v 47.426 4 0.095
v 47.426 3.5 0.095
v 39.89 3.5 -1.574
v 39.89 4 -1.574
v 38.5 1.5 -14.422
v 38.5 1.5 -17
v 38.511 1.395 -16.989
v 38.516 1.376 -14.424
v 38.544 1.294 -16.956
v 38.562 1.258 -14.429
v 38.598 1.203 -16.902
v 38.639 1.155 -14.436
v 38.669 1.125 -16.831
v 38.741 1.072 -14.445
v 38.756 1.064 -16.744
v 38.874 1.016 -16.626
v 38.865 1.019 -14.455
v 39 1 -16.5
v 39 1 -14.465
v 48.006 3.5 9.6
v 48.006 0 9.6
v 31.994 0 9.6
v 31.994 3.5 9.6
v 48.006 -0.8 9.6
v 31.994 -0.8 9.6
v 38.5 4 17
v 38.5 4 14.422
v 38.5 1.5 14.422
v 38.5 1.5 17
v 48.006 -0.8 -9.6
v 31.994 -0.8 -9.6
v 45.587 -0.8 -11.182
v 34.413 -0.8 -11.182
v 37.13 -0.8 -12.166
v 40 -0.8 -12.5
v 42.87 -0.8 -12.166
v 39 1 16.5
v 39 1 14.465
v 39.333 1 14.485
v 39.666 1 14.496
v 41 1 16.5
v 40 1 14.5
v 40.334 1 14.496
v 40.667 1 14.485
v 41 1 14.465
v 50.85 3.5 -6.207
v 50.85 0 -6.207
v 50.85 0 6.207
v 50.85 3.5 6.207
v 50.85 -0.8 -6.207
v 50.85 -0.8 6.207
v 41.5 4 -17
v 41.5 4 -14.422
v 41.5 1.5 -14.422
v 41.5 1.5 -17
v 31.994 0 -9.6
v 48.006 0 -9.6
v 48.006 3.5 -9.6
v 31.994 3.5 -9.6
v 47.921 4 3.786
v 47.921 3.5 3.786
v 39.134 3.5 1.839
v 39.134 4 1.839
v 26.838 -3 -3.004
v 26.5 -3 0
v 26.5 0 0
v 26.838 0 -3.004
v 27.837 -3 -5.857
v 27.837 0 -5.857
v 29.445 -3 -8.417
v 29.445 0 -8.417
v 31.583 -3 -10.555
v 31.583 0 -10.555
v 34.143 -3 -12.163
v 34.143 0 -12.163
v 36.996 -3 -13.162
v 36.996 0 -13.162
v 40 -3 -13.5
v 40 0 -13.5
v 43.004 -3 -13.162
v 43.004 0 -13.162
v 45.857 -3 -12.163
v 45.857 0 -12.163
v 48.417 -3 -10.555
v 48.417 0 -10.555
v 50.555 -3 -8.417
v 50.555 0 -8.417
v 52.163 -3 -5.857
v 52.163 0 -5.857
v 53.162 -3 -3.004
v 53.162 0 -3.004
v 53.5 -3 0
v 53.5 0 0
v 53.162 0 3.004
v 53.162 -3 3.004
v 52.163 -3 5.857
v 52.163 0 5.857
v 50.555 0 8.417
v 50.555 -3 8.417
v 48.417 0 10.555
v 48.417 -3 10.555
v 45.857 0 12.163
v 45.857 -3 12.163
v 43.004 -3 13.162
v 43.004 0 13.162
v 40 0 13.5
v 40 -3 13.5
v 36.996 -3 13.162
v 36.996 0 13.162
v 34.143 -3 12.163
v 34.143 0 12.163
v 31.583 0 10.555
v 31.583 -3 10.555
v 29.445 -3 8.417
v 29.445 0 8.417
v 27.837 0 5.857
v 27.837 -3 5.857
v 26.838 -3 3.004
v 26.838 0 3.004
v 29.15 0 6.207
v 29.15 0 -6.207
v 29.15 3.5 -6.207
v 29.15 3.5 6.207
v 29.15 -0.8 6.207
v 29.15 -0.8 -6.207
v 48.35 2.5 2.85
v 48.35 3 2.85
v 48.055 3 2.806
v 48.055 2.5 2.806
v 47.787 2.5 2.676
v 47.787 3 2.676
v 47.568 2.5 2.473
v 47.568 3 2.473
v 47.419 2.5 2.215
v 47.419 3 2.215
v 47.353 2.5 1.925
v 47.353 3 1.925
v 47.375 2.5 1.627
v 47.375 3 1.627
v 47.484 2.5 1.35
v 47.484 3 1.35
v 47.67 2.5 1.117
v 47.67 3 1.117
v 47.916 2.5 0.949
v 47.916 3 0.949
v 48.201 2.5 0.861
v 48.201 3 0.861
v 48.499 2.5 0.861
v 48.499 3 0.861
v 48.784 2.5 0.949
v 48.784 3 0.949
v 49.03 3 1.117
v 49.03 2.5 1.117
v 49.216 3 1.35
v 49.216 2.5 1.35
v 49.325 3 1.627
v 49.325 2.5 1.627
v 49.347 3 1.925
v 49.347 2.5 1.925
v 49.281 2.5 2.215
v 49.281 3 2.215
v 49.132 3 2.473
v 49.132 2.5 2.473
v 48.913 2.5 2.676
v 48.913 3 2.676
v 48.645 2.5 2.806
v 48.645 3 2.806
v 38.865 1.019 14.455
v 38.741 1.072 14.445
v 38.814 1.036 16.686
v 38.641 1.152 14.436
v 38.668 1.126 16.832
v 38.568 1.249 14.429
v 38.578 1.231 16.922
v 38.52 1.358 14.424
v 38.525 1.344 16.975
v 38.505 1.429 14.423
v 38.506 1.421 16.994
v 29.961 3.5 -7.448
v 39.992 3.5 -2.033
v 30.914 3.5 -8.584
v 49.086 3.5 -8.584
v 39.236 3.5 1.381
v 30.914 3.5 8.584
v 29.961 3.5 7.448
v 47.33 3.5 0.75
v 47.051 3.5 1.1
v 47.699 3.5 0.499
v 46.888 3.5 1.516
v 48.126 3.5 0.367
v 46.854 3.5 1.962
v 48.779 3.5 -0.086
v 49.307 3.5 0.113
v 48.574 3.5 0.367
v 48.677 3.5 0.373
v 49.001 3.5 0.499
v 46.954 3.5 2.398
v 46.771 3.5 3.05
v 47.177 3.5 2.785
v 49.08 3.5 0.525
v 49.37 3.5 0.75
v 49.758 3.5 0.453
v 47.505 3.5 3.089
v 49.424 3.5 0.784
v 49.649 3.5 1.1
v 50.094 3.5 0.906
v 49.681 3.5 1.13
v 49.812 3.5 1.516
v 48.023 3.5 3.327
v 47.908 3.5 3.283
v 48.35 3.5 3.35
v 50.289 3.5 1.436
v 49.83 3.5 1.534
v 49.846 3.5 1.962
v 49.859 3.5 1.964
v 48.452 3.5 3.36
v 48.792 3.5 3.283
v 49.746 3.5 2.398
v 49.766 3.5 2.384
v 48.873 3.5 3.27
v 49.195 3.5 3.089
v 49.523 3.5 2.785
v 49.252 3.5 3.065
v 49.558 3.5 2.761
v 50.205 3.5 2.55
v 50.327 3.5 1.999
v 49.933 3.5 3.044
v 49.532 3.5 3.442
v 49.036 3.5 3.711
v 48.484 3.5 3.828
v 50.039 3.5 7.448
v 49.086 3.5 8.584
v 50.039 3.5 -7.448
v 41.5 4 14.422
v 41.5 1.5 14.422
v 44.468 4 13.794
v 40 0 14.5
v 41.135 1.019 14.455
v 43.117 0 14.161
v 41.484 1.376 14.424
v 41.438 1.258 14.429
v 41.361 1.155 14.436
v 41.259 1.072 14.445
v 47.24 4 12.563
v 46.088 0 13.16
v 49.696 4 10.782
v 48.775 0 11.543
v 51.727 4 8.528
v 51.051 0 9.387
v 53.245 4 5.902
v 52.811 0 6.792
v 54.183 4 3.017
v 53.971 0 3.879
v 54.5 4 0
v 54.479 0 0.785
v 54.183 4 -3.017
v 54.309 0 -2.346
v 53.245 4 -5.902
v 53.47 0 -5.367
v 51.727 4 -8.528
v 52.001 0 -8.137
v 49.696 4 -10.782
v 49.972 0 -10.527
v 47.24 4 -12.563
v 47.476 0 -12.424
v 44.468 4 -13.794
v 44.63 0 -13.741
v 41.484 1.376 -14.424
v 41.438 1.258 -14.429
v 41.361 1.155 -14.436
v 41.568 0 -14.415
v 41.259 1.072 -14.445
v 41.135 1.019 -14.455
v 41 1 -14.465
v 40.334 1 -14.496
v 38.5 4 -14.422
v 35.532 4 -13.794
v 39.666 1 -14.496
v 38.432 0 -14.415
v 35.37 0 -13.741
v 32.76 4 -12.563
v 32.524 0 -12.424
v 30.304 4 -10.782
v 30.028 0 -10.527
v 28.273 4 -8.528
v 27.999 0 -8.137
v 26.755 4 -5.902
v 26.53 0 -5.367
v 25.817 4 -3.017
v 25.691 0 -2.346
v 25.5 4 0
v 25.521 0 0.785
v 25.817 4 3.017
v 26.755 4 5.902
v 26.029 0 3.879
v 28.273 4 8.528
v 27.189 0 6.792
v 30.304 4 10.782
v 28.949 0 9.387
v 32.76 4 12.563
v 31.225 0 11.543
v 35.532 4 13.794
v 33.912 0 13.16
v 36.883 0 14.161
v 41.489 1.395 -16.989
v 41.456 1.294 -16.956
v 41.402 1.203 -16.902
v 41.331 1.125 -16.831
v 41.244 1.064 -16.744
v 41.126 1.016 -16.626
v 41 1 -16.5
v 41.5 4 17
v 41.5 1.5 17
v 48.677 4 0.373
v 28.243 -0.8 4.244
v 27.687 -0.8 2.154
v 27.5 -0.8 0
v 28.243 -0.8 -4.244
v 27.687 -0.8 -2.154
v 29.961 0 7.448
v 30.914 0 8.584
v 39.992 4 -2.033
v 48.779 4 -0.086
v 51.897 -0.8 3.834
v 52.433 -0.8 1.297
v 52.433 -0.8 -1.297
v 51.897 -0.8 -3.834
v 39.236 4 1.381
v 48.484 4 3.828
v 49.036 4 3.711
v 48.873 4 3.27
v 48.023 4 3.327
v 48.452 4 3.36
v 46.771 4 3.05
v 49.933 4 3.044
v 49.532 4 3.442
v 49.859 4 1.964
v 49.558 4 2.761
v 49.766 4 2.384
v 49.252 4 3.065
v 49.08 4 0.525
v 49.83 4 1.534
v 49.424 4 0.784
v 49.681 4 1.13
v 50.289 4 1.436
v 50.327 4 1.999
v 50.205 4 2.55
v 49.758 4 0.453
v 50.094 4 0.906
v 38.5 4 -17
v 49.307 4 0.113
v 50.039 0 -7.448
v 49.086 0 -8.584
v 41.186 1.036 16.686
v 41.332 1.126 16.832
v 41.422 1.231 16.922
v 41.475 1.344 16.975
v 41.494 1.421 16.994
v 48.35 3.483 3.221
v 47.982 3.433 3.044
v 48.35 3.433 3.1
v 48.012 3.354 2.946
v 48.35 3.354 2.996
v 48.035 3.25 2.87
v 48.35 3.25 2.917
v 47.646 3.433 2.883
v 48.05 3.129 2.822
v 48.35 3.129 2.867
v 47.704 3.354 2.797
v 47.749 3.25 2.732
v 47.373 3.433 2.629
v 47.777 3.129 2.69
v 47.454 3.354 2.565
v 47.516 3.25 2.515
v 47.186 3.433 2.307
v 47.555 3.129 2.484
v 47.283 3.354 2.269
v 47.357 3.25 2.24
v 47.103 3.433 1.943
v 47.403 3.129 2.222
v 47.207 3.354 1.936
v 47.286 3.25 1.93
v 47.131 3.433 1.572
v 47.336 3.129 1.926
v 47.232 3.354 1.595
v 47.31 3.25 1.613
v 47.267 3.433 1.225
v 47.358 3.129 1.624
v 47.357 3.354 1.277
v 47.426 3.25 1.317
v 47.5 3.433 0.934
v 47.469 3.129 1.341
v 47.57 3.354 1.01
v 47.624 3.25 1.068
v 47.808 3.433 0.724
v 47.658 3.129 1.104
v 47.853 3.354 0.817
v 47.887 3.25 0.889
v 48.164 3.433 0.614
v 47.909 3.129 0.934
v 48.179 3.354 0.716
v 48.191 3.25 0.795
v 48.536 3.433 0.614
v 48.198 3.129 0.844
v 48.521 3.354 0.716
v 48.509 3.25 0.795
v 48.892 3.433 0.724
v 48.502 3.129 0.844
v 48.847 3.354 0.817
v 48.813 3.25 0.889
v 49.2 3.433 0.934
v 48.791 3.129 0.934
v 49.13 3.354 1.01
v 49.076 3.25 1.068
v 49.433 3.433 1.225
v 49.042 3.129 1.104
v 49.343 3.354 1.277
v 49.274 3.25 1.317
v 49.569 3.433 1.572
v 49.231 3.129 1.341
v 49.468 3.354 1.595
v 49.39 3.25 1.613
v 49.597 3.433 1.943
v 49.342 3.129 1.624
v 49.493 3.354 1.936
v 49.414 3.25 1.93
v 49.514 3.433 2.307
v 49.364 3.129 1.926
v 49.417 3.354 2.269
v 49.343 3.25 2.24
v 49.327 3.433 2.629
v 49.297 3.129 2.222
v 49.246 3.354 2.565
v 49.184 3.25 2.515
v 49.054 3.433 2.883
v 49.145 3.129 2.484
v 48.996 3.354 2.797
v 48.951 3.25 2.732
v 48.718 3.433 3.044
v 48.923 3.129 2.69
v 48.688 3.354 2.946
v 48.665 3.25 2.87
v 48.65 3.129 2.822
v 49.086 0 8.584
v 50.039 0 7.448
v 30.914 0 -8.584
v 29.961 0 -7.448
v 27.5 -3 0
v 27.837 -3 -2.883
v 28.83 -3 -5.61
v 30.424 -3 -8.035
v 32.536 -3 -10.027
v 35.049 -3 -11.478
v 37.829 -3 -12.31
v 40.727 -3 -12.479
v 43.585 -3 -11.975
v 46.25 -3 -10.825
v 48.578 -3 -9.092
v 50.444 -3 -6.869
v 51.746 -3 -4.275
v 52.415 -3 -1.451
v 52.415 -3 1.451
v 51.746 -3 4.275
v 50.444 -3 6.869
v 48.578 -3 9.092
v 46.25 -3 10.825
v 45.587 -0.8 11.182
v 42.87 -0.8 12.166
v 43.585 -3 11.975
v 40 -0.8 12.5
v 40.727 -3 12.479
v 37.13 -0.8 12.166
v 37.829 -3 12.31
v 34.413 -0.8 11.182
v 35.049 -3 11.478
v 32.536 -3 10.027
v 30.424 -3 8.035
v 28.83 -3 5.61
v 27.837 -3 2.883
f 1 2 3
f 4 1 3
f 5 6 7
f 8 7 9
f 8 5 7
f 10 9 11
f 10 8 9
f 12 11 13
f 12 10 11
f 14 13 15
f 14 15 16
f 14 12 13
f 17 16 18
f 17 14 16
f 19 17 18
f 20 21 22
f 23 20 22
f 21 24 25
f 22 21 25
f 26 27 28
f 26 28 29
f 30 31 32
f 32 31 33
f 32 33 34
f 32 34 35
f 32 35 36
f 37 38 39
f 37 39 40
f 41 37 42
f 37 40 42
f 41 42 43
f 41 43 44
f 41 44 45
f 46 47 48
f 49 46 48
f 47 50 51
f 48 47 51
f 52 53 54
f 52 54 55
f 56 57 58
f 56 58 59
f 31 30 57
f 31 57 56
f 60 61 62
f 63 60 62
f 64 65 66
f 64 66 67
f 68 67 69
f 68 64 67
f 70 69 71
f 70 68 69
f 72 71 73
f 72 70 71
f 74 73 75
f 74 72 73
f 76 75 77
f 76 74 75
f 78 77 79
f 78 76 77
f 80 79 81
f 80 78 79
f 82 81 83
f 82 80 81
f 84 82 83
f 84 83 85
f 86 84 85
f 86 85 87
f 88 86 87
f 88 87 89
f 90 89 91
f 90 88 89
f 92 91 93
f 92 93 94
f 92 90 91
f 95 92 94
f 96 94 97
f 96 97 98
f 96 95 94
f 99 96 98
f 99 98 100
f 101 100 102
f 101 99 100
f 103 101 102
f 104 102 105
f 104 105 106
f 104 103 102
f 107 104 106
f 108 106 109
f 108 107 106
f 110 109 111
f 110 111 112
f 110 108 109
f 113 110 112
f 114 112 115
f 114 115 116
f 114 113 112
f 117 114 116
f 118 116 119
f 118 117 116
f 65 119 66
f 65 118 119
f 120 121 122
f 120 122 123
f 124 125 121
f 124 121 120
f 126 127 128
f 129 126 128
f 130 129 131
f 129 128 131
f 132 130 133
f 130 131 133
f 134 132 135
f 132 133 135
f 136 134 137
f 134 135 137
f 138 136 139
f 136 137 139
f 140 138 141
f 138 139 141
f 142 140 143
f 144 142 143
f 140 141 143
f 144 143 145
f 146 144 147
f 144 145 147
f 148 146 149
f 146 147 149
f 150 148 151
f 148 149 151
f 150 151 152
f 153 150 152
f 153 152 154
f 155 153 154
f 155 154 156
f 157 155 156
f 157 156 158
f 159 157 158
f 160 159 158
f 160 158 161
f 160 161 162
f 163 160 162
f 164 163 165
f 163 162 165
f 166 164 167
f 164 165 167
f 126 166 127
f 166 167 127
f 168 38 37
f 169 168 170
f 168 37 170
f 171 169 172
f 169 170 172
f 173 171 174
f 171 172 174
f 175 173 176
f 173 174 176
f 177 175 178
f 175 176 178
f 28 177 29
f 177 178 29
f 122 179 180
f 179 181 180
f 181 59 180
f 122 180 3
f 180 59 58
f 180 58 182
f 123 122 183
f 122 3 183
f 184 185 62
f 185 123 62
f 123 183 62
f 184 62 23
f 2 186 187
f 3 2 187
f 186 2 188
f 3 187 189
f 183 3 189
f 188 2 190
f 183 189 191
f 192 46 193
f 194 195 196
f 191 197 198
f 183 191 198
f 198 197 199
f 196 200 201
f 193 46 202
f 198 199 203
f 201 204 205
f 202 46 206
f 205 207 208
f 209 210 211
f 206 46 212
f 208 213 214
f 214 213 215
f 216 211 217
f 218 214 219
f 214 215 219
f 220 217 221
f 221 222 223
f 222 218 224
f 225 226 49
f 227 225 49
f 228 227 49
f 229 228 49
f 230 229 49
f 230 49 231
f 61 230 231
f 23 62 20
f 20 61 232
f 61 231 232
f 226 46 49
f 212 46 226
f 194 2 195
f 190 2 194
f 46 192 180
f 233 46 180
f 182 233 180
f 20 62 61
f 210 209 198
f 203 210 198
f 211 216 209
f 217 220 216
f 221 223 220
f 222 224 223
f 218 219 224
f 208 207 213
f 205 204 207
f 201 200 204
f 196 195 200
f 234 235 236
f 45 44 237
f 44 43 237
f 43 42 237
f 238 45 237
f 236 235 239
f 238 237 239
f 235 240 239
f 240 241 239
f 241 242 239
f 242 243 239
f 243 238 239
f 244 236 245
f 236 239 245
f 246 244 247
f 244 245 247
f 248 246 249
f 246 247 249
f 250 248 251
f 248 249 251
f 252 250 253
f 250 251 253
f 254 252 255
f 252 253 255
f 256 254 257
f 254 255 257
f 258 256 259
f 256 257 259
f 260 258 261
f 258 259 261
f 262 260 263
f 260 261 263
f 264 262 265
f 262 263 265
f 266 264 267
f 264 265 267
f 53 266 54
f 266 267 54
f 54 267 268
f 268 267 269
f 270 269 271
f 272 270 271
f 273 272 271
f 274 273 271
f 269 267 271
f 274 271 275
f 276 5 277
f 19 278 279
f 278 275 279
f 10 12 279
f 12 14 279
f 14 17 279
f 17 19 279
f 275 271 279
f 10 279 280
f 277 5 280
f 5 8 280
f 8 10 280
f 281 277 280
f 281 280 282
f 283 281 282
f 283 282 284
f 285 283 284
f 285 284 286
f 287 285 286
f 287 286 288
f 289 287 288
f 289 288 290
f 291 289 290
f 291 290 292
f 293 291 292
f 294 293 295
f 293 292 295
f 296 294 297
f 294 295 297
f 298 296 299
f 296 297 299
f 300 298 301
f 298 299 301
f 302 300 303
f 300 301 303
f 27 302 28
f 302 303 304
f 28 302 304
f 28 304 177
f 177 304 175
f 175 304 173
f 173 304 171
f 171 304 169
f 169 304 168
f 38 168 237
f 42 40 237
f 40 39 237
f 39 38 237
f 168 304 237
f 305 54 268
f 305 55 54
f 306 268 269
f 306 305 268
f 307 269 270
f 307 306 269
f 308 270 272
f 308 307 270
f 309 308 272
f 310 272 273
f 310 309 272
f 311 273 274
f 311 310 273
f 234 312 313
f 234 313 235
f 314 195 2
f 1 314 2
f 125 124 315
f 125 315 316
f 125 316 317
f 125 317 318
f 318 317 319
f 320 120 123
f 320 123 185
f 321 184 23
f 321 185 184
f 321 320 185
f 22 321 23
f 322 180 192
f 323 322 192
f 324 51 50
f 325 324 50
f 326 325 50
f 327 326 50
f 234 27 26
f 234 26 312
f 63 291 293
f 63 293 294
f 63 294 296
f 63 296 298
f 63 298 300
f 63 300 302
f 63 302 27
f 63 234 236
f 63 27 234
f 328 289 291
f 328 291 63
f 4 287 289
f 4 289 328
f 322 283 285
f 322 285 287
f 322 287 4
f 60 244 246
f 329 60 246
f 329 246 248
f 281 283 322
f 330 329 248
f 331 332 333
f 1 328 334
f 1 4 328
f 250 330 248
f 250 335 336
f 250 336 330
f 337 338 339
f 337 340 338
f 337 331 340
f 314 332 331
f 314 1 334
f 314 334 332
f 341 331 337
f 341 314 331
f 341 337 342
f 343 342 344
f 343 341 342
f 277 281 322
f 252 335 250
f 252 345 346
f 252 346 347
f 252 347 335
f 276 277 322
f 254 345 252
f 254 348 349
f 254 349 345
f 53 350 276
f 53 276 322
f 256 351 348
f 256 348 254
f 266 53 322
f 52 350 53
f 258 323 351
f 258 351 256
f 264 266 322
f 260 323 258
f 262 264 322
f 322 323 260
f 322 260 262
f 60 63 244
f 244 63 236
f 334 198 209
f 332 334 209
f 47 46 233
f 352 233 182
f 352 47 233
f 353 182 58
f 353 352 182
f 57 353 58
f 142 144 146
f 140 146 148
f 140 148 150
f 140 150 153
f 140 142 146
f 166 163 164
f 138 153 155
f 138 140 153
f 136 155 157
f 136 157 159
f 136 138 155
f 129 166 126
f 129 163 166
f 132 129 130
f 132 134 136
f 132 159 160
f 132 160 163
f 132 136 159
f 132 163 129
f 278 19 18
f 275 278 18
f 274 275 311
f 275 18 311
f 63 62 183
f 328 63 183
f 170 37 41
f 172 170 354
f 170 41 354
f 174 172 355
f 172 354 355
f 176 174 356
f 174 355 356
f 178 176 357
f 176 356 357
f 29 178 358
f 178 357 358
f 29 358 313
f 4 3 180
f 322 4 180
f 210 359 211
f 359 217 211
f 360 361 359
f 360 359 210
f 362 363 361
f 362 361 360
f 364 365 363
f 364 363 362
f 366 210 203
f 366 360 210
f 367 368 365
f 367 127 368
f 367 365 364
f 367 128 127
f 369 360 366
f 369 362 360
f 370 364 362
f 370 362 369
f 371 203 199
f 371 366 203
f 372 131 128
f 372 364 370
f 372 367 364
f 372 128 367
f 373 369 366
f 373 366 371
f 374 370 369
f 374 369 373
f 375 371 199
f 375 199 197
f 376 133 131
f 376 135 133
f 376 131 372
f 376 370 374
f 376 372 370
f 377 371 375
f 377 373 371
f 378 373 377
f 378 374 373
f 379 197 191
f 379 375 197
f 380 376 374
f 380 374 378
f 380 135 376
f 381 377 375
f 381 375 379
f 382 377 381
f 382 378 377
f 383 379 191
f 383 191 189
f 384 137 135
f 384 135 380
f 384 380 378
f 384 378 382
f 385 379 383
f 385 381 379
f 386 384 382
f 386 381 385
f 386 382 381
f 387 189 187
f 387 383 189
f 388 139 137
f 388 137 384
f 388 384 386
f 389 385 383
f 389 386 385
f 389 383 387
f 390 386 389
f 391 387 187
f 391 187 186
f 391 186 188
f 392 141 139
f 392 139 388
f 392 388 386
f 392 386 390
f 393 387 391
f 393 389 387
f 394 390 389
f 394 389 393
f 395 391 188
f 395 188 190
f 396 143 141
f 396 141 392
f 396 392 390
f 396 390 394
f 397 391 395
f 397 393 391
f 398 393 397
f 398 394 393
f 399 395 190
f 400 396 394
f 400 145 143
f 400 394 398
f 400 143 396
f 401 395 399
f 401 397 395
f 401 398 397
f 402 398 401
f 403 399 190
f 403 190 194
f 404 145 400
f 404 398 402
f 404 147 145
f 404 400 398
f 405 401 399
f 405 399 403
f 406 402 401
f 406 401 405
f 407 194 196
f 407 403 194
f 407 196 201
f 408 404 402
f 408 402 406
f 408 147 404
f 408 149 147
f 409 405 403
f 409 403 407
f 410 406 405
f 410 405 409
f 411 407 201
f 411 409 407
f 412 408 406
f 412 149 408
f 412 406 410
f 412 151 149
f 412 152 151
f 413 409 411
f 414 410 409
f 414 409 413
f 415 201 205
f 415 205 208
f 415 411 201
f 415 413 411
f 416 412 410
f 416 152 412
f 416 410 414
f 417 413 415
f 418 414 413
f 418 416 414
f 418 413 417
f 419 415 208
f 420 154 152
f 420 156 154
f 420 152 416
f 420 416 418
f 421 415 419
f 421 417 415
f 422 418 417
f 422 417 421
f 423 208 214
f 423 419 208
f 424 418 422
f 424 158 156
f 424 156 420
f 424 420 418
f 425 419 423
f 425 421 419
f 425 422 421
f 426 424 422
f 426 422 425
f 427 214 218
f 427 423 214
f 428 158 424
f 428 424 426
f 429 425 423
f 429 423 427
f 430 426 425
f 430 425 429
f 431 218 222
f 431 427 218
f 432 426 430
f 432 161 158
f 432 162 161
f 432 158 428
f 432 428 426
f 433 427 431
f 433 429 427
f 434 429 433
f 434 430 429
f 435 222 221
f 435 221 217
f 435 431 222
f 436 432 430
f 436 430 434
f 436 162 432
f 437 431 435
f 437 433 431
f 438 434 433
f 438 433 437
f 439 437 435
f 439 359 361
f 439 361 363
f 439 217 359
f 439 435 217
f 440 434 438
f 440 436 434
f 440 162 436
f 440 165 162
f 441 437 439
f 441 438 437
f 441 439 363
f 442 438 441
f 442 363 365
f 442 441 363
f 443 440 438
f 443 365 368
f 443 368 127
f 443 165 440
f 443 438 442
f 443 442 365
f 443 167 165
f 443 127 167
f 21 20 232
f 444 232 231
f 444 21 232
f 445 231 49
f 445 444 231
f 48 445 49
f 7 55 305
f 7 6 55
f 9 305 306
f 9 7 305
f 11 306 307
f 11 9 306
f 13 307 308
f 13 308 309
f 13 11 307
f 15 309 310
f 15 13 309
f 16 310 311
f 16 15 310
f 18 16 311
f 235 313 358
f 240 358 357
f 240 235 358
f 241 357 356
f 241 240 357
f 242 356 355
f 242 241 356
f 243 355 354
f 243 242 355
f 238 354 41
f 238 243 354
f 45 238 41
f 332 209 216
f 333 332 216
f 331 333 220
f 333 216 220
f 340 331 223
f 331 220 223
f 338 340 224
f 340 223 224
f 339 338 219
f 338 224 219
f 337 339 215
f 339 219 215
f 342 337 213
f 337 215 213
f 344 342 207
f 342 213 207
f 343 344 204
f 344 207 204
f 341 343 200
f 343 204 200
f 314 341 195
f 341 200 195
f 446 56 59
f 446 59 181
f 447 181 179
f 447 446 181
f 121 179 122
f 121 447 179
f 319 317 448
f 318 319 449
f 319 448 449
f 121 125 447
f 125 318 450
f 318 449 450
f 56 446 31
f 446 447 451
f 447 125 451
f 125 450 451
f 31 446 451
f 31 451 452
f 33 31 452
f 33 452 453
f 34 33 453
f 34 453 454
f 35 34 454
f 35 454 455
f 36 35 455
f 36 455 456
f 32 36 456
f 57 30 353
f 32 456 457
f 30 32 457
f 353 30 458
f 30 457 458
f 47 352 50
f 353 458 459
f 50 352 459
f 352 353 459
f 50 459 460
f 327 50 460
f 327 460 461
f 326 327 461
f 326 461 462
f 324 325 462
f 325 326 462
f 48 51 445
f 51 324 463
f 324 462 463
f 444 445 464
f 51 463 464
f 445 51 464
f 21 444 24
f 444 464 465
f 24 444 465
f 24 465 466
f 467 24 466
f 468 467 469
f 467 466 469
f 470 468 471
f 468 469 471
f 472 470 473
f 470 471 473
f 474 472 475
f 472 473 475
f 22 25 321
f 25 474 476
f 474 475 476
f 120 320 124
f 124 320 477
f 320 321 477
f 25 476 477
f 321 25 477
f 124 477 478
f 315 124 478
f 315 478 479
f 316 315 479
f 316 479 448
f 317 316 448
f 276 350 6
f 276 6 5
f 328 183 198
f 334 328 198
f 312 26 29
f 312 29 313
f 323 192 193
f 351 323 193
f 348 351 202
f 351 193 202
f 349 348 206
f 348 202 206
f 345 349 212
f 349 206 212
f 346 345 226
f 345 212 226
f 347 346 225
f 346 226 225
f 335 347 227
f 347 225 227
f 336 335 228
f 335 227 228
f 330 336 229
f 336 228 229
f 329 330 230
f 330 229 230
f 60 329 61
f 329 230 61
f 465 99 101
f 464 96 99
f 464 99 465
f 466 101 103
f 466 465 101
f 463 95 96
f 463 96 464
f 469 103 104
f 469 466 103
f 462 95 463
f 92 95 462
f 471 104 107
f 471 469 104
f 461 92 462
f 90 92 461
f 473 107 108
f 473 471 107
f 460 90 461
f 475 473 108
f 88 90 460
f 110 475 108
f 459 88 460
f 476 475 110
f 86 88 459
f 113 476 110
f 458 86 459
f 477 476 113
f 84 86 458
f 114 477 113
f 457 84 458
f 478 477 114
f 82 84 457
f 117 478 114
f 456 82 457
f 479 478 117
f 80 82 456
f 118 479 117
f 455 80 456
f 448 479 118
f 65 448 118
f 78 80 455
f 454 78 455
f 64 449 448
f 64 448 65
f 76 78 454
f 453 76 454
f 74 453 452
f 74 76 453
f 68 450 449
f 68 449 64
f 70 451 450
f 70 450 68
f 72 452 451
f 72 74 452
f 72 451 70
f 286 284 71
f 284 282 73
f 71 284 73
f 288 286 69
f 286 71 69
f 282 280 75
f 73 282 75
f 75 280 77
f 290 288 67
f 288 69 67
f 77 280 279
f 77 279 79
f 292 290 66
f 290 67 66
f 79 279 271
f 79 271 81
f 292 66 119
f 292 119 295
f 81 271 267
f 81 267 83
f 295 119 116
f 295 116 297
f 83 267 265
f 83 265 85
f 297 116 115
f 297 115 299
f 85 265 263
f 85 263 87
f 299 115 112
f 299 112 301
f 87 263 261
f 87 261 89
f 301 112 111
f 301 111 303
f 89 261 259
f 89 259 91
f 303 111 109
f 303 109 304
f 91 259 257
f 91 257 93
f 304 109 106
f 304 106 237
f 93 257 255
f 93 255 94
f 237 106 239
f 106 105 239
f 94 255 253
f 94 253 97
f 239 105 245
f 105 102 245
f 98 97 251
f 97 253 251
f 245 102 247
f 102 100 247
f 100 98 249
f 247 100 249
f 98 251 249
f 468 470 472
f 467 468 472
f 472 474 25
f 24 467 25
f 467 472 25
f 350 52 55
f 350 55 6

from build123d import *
from build123d.topology import SkipClean

# Parameters (mm, degrees)
SKETCH7_R            = 14.5
SKETCH7_R_2          = 12.5
BOSS_EXTRUDE2_DEPTH  = 4
BOSS_EXTRUDE6_START  = 3.5
SKETCH7_3_R          = 14.5
BOSS_EXTRUDE6_DEPTH  = 0.5
BOSS_EXTRUDE10_START = 4.3
BOSS_EXTRUDE10_DEPTH = 4.3
BOSS_EXTRUDE9_START  = -3
BOSS_EXTRUDE9_DEPTH  = 3
FILLET6_R            = 0.5
CUT_EXTRUDE1_DEPTH   = 58.251550322
SKETCH16_R           = 1
BOSS_EXTRUDE11_DEPTH = 1
FILLET7_R            = 0.5
EXTRUDE_THIN2_START  = 3
SKETCH17_R           = 13.5
SKETCH17_R_2         = 12.5
EXTRUDE_THIN2_DEPTH  = 3


with BuildPart() as part:
    # Sketch7 → Boss-Extrude2 (new body)
    with BuildSketch(Plane(origin=(0, 0, 0), x_dir=(1, 0, 0), z_dir=(0, 1, 0))):
        with Locations((40, 0)):
            Circle(SKETCH7_R)
        with Locations((40, 0)):
            Circle(SKETCH7_R_2, mode=Mode.SUBTRACT)
    extrude(amount=BOSS_EXTRUDE2_DEPTH)

    # Sketch7<3> → Boss-Extrude6 (add)
    with BuildSketch(Plane(origin=(0, 0, 0), x_dir=(1, 0, 0), z_dir=(0, 1, 0)).offset(BOSS_EXTRUDE6_START)):
        with Locations((40, 0)):
            Circle(SKETCH7_3_R)
    extrude(amount=BOSS_EXTRUDE6_DEPTH)

    # Sketch14 → Boss-Extrude10 (add)
    with BuildSketch(Plane.XZ.offset(-3.5).offset(BOSS_EXTRUDE10_START)):
        with BuildLine():
            Line((48.005623024, -9.6), (31.994376976, -9.6))
            ThreePointArc((31.994376976, -9.6), (40, -12.5), (48.005623024, -9.6))
        make_face()
        with BuildLine():
            Line((50.85, -6.207052441), (50.85, 6.207052441))
            ThreePointArc((50.85, 6.207052441), (52.5, 0), (50.85, -6.207052441))
        make_face()
        with BuildLine():
            Line((48.005623024, 9.6), (31.994376976, 9.6))
            ThreePointArc((31.994376976, 9.6), (40, 12.5), (48.005623024, 9.6))
        make_face()
        with BuildLine():
            Line((29.15, -6.207052441), (29.15, 6.207052441))
            ThreePointArc((29.15, 6.207052441), (27.5, 0), (29.15, -6.207052441))
        make_face()
    extrude(amount=-BOSS_EXTRUDE10_DEPTH)

    # Sketch11 → Boss-Extrude9 (add)
    with BuildSketch(Plane(origin=(0, 4, 0), x_dir=(1, 0, 0), z_dir=(0, 1, 0)).offset(BOSS_EXTRUDE9_START)):
        with BuildLine():
            Line((41.5, 17), (38.5, 17))
            Line((38.5, 17), (38.5, 14.422205102))
            ThreePointArc((38.5, 14.422205102), (40, 14.5), (41.5, 14.422205102))
            Line((41.5, 14.422205102), (41.5, 17))
        make_face()
        with BuildLine():
            ThreePointArc((41.5, -14.422205102), (40, -14.5), (38.5, -14.422205102))
            Line((38.5, -14.422205102), (38.5, -17))
            Line((38.5, -17), (41.5, -17))
            Line((41.5, -17), (41.5, -14.422205102))
        make_face()
    extrude(amount=BOSS_EXTRUDE9_DEPTH)

    # Fillet6
    fillet6_edges = [part.edges().sort_by_distance(p)[0] for p in [
        (41.5, 1, 15.711102551),
        (38.5, 1, 15.711102551),
        (38.5, 1, -15.711102551),
        (41.5, 1, -15.711102551),
        (40, 1, -17),
        (40, 1, 17),
    ]]
    fillet(fillet6_edges, radius=FILLET6_R)

    # Sketch15 → Cut-Extrude1 (cut, through all)
    with BuildSketch(Plane(origin=(0, 3.5, 0), x_dir=(-1, 0, 0), z_dir=(0, -1, 0))):
        with BuildLine():
            Line((-39.992028986, 2.032868758), (-48.778948791, 0.086066167))
            ThreePointArc((-48.778948791, 0.086066167), (-50.286066167, -2.278948791), (-47.921051209, -3.786066167))
            Line((-47.921051209, -3.786066167), (-39.134131403, -1.839263575))
            Line((-39.134131403, -1.839263575), (-39.235771296, -1.380510545))
            Line((-39.235771296, -1.380510545), (-48.022691101, -3.327313137))
            ThreePointArc((-48.022691101, -3.327313137), (-49.827313137, -2.177308899), (-48.677308899, -0.372686863))
            Line((-48.677308899, -0.372686863), (-39.890389093, 1.574115728))
            Line((-39.890389093, 1.574115728), (-39.992028986, 2.032868758))
        make_face()
    extrude(amount=-CUT_EXTRUDE1_DEPTH, mode=Mode.SUBTRACT)

    # Sketch16 → Boss-Extrude11 (add)
    with BuildSketch(Plane(origin=(0, 3.5, 0), x_dir=(-1, 0, 0), z_dir=(0, -1, 0))):
        with Locations((-48.35, -1.85)):
            Circle(SKETCH16_R)
    extrude(amount=BOSS_EXTRUDE11_DEPTH)

    # Fillet7
    fillet7_edges = [part.edges().sort_by_distance(p)[0] for p in [
        (49.35, 3.5, 1.85),
    ]]
    fillet(fillet7_edges, radius=FILLET7_R)

    # Sketch17 → Extrude-Thin2 (add)
    with SkipClean():  # the faces are left unmerged after this step: merging them gives an invalid solid
        with BuildSketch(Plane(origin=(0, 0, 0), x_dir=(-1, 0, 0), z_dir=(0, -1, 0)).offset(EXTRUDE_THIN2_START)):
            with Locations((-40, 0)):
                Circle(SKETCH17_R)
            with Locations((-40, 0)):
                Circle(SKETCH17_R_2, mode=Mode.SUBTRACT)
        extrude(amount=-EXTRUDE_THIN2_DEPTH)
    add(part.part.scale(1), mode=Mode.REPLACE)  # the faces are merged on a copy


solid = part.part
